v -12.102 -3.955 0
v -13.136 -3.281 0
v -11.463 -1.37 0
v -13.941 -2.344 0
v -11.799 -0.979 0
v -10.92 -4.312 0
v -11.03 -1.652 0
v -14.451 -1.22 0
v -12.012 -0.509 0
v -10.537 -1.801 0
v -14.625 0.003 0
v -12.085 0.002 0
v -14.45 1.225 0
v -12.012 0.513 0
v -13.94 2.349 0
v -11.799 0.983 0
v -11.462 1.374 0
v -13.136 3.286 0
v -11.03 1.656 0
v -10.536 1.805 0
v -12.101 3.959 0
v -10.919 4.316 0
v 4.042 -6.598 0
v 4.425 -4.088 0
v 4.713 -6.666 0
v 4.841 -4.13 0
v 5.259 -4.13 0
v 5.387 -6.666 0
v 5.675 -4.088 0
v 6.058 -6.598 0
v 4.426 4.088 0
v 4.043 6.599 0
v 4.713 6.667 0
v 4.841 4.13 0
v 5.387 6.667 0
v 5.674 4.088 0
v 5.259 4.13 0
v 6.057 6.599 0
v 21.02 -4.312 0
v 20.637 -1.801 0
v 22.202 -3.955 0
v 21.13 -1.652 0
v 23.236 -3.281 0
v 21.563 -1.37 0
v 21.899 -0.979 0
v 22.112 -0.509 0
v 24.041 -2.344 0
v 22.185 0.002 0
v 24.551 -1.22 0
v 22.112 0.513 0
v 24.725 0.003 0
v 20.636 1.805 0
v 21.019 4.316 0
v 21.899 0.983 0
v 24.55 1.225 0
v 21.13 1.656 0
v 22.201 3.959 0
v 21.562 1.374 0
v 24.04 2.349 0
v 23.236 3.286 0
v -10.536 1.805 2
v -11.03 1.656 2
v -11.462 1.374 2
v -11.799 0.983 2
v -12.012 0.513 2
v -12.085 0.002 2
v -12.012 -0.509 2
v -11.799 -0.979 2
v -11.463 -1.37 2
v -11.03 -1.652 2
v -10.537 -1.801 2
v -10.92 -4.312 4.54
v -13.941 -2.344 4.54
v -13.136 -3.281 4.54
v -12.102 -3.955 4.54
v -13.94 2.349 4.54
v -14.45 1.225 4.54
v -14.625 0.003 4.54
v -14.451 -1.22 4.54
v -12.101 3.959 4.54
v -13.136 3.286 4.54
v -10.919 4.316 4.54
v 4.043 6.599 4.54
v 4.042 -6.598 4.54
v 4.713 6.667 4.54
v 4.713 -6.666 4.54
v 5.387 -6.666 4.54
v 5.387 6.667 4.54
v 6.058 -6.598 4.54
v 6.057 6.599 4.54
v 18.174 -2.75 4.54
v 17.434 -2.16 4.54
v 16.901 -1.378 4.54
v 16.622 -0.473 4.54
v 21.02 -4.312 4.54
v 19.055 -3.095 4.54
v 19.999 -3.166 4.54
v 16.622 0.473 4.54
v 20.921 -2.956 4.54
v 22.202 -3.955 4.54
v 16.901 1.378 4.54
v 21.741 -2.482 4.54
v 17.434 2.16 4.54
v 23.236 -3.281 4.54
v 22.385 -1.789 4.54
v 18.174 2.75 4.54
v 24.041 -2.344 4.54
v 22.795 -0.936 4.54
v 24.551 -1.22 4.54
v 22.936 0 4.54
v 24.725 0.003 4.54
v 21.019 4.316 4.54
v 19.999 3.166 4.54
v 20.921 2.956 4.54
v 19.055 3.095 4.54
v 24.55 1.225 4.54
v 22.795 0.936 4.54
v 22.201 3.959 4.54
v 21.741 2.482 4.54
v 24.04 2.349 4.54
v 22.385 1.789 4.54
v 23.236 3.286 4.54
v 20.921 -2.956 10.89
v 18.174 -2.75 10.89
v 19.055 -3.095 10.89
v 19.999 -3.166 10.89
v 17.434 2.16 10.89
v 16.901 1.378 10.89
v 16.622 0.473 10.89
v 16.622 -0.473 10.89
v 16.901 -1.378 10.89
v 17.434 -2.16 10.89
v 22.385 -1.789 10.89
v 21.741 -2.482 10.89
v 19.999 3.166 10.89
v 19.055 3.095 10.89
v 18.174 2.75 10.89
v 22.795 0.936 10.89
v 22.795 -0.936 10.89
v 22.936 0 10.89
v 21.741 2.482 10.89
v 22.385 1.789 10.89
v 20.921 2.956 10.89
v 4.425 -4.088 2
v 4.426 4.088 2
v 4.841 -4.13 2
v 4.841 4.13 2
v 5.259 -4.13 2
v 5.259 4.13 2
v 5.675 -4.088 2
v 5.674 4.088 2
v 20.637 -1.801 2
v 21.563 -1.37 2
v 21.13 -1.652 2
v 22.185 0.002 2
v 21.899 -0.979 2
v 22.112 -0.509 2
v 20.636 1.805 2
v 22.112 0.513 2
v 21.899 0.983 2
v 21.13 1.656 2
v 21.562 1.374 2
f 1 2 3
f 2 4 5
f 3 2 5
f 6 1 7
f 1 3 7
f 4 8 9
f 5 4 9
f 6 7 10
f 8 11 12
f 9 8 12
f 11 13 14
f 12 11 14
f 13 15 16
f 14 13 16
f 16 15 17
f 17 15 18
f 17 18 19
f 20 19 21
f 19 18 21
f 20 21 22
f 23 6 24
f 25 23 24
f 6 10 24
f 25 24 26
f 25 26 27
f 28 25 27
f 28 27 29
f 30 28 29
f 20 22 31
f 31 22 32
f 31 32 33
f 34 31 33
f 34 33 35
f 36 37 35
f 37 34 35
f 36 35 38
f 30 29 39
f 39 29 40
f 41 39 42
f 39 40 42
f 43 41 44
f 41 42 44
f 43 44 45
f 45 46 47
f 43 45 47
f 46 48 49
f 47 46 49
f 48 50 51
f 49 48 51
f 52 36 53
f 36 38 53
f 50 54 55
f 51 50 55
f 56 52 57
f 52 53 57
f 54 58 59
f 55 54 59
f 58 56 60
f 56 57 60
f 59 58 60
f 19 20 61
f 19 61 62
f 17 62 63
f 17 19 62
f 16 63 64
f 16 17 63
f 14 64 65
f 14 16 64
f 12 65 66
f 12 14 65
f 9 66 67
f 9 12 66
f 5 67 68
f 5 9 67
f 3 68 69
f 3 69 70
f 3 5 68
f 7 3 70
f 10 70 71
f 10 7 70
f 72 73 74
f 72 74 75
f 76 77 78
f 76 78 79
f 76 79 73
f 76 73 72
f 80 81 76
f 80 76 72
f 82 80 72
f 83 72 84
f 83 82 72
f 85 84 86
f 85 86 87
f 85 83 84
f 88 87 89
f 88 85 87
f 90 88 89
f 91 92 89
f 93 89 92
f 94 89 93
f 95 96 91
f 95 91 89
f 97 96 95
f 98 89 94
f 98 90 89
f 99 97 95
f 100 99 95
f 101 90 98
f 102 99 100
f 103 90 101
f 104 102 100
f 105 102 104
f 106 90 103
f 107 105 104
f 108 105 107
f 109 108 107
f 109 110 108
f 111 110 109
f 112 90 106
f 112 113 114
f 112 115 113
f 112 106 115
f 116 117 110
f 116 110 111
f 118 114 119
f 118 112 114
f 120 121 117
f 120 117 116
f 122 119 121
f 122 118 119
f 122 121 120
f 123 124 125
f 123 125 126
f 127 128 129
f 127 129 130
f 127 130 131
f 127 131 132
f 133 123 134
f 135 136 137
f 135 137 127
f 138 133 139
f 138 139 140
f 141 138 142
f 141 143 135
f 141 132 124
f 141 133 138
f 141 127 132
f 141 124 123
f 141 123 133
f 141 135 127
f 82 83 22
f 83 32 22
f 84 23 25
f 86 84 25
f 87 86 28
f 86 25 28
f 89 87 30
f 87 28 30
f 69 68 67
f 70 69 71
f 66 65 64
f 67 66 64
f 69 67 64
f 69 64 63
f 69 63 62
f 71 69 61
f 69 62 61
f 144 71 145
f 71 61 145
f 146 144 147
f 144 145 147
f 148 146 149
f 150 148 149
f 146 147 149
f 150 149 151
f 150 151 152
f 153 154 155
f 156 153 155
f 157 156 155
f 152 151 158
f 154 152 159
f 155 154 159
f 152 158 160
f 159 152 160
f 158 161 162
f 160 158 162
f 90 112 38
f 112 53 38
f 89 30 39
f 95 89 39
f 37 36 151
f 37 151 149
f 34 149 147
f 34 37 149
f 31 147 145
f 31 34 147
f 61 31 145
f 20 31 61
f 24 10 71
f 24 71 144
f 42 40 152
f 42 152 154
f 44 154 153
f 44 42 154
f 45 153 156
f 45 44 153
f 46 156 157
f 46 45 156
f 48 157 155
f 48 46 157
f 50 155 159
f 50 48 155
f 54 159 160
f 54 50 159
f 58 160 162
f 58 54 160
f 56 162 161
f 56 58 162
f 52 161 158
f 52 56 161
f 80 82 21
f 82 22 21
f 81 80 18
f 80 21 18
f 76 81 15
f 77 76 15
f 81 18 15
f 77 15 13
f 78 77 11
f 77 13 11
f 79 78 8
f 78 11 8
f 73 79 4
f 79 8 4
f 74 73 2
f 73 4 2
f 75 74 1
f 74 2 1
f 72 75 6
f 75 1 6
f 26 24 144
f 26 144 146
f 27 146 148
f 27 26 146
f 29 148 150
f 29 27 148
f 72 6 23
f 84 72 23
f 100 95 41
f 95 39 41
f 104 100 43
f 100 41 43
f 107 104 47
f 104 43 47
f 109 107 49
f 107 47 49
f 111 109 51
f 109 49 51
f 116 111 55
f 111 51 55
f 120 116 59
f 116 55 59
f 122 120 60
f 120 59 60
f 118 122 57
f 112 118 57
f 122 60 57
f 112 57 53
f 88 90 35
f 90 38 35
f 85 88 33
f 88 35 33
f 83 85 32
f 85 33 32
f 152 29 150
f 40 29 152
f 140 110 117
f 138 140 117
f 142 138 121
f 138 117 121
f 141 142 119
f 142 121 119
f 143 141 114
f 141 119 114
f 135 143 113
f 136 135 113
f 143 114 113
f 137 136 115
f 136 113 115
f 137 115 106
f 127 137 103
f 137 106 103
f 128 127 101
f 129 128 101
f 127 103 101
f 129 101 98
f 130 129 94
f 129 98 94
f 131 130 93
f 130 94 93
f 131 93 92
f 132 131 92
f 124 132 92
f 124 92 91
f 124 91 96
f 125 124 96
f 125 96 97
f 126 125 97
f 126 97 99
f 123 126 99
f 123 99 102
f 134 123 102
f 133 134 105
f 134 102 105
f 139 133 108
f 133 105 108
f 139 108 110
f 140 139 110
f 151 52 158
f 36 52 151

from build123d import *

# Parameters (mm, degrees)
BOSS_EXTRUDE1_DEPTH = 2
BOSS_EXTRUDE2_DEPTH = 2.54
SKETCH3_R           = 3.175
BOSS_EXTRUDE3_DEPTH = 6.35


with BuildPart() as part:
    # Sketch1 → Boss-Extrude1 (new body)
    with BuildSketch(Plane.XY):
        with BuildLine():
            Line((6.058373601, -6.598394326), (21.020213328, -4.31191015))
            ThreePointArc((21.020213328, -4.31191015), (24.724999848, 0.002643865), (21.019053909, 4.316202049))
            Line((21.019053909, 4.316202049), (6.056600222, 6.598665092))
            ThreePointArc((6.056600222, 6.598665092), (5.05, 6.675), (4.043399778, 6.598665092))
            Line((4.043399778, 6.598665092), (-10.919053909, 4.316202049))
            ThreePointArc((-10.919053909, 4.316202049), (-14.624999848, 0.002643865), (-10.920213328, -4.31191015))
            Line((-10.920213328, -4.31191015), (4.041626399, -6.598394326))
            ThreePointArc((4.041626399, -6.598394326), (5.05, -6.675), (6.058373601, -6.598394326))
        make_face()
        with BuildLine():
            Line((20.63601802, 1.80524934), (5.673564332, 4.087712383))
            ThreePointArc((5.673564332, 4.087712383), (5.05, 4.135), (4.426435668, 4.087712383))
            Line((4.426435668, 4.087712383), (-10.53601802, 1.80524934))
            ThreePointArc((-10.53601802, 1.80524934), (-12.084999871, 0.002302548), (-10.536502624, -1.801060474))
            Line((-10.536502624, -1.801060474), (4.425337102, -4.08754465))
            ThreePointArc((4.425337102, -4.08754465), (5.05, -4.135), (5.674662898, -4.08754465))
            Line((5.674662898, -4.08754465), (20.636502624, -1.801060474))
            ThreePointArc((20.636502624, -1.801060474), (22.184999871, 0.002302548), (20.63601802, 1.80524934))
        make_face(mode=Mode.SUBTRACT)
    extrude(amount=BOSS_EXTRUDE1_DEPTH)

    # Sketch2 → Boss-Extrude2 (add)
    with BuildSketch(Plane.XY.offset(2)):
        with BuildLine():
            Line((6.058373601, -6.598394326), (21.020213328, -4.31191015))
            ThreePointArc((21.020213328, -4.31191015), (24.724999848, 0.002643865), (21.019053909, 4.316202049))
            Line((21.019053909, 4.316202049), (6.056600222, 6.598665092))
            ThreePointArc((6.056600222, 6.598665092), (5.05, 6.675), (4.043399778, 6.598665092))
            Line((4.043399778, 6.598665092), (-10.919053909, 4.316202049))
            ThreePointArc((-10.919053909, 4.316202049), (-14.624999848, 0.002643865), (-10.920213328, -4.31191015))
            Line((-10.920213328, -4.31191015), (4.041626399, -6.598394326))
            ThreePointArc((4.041626399, -6.598394326), (5.05, -6.675), (6.058373601, -6.598394326))
        make_face()
    extrude(amount=BOSS_EXTRUDE2_DEPTH)

    # Sketch3 → Boss-Extrude3 (add)
    with BuildSketch(Plane.XY.offset(4.54)):
        with Locations((19.761311468, 0)):
            Circle(SKETCH3_R)
    extrude(amount=BOSS_EXTRUDE3_DEPTH)


solid = part.part
